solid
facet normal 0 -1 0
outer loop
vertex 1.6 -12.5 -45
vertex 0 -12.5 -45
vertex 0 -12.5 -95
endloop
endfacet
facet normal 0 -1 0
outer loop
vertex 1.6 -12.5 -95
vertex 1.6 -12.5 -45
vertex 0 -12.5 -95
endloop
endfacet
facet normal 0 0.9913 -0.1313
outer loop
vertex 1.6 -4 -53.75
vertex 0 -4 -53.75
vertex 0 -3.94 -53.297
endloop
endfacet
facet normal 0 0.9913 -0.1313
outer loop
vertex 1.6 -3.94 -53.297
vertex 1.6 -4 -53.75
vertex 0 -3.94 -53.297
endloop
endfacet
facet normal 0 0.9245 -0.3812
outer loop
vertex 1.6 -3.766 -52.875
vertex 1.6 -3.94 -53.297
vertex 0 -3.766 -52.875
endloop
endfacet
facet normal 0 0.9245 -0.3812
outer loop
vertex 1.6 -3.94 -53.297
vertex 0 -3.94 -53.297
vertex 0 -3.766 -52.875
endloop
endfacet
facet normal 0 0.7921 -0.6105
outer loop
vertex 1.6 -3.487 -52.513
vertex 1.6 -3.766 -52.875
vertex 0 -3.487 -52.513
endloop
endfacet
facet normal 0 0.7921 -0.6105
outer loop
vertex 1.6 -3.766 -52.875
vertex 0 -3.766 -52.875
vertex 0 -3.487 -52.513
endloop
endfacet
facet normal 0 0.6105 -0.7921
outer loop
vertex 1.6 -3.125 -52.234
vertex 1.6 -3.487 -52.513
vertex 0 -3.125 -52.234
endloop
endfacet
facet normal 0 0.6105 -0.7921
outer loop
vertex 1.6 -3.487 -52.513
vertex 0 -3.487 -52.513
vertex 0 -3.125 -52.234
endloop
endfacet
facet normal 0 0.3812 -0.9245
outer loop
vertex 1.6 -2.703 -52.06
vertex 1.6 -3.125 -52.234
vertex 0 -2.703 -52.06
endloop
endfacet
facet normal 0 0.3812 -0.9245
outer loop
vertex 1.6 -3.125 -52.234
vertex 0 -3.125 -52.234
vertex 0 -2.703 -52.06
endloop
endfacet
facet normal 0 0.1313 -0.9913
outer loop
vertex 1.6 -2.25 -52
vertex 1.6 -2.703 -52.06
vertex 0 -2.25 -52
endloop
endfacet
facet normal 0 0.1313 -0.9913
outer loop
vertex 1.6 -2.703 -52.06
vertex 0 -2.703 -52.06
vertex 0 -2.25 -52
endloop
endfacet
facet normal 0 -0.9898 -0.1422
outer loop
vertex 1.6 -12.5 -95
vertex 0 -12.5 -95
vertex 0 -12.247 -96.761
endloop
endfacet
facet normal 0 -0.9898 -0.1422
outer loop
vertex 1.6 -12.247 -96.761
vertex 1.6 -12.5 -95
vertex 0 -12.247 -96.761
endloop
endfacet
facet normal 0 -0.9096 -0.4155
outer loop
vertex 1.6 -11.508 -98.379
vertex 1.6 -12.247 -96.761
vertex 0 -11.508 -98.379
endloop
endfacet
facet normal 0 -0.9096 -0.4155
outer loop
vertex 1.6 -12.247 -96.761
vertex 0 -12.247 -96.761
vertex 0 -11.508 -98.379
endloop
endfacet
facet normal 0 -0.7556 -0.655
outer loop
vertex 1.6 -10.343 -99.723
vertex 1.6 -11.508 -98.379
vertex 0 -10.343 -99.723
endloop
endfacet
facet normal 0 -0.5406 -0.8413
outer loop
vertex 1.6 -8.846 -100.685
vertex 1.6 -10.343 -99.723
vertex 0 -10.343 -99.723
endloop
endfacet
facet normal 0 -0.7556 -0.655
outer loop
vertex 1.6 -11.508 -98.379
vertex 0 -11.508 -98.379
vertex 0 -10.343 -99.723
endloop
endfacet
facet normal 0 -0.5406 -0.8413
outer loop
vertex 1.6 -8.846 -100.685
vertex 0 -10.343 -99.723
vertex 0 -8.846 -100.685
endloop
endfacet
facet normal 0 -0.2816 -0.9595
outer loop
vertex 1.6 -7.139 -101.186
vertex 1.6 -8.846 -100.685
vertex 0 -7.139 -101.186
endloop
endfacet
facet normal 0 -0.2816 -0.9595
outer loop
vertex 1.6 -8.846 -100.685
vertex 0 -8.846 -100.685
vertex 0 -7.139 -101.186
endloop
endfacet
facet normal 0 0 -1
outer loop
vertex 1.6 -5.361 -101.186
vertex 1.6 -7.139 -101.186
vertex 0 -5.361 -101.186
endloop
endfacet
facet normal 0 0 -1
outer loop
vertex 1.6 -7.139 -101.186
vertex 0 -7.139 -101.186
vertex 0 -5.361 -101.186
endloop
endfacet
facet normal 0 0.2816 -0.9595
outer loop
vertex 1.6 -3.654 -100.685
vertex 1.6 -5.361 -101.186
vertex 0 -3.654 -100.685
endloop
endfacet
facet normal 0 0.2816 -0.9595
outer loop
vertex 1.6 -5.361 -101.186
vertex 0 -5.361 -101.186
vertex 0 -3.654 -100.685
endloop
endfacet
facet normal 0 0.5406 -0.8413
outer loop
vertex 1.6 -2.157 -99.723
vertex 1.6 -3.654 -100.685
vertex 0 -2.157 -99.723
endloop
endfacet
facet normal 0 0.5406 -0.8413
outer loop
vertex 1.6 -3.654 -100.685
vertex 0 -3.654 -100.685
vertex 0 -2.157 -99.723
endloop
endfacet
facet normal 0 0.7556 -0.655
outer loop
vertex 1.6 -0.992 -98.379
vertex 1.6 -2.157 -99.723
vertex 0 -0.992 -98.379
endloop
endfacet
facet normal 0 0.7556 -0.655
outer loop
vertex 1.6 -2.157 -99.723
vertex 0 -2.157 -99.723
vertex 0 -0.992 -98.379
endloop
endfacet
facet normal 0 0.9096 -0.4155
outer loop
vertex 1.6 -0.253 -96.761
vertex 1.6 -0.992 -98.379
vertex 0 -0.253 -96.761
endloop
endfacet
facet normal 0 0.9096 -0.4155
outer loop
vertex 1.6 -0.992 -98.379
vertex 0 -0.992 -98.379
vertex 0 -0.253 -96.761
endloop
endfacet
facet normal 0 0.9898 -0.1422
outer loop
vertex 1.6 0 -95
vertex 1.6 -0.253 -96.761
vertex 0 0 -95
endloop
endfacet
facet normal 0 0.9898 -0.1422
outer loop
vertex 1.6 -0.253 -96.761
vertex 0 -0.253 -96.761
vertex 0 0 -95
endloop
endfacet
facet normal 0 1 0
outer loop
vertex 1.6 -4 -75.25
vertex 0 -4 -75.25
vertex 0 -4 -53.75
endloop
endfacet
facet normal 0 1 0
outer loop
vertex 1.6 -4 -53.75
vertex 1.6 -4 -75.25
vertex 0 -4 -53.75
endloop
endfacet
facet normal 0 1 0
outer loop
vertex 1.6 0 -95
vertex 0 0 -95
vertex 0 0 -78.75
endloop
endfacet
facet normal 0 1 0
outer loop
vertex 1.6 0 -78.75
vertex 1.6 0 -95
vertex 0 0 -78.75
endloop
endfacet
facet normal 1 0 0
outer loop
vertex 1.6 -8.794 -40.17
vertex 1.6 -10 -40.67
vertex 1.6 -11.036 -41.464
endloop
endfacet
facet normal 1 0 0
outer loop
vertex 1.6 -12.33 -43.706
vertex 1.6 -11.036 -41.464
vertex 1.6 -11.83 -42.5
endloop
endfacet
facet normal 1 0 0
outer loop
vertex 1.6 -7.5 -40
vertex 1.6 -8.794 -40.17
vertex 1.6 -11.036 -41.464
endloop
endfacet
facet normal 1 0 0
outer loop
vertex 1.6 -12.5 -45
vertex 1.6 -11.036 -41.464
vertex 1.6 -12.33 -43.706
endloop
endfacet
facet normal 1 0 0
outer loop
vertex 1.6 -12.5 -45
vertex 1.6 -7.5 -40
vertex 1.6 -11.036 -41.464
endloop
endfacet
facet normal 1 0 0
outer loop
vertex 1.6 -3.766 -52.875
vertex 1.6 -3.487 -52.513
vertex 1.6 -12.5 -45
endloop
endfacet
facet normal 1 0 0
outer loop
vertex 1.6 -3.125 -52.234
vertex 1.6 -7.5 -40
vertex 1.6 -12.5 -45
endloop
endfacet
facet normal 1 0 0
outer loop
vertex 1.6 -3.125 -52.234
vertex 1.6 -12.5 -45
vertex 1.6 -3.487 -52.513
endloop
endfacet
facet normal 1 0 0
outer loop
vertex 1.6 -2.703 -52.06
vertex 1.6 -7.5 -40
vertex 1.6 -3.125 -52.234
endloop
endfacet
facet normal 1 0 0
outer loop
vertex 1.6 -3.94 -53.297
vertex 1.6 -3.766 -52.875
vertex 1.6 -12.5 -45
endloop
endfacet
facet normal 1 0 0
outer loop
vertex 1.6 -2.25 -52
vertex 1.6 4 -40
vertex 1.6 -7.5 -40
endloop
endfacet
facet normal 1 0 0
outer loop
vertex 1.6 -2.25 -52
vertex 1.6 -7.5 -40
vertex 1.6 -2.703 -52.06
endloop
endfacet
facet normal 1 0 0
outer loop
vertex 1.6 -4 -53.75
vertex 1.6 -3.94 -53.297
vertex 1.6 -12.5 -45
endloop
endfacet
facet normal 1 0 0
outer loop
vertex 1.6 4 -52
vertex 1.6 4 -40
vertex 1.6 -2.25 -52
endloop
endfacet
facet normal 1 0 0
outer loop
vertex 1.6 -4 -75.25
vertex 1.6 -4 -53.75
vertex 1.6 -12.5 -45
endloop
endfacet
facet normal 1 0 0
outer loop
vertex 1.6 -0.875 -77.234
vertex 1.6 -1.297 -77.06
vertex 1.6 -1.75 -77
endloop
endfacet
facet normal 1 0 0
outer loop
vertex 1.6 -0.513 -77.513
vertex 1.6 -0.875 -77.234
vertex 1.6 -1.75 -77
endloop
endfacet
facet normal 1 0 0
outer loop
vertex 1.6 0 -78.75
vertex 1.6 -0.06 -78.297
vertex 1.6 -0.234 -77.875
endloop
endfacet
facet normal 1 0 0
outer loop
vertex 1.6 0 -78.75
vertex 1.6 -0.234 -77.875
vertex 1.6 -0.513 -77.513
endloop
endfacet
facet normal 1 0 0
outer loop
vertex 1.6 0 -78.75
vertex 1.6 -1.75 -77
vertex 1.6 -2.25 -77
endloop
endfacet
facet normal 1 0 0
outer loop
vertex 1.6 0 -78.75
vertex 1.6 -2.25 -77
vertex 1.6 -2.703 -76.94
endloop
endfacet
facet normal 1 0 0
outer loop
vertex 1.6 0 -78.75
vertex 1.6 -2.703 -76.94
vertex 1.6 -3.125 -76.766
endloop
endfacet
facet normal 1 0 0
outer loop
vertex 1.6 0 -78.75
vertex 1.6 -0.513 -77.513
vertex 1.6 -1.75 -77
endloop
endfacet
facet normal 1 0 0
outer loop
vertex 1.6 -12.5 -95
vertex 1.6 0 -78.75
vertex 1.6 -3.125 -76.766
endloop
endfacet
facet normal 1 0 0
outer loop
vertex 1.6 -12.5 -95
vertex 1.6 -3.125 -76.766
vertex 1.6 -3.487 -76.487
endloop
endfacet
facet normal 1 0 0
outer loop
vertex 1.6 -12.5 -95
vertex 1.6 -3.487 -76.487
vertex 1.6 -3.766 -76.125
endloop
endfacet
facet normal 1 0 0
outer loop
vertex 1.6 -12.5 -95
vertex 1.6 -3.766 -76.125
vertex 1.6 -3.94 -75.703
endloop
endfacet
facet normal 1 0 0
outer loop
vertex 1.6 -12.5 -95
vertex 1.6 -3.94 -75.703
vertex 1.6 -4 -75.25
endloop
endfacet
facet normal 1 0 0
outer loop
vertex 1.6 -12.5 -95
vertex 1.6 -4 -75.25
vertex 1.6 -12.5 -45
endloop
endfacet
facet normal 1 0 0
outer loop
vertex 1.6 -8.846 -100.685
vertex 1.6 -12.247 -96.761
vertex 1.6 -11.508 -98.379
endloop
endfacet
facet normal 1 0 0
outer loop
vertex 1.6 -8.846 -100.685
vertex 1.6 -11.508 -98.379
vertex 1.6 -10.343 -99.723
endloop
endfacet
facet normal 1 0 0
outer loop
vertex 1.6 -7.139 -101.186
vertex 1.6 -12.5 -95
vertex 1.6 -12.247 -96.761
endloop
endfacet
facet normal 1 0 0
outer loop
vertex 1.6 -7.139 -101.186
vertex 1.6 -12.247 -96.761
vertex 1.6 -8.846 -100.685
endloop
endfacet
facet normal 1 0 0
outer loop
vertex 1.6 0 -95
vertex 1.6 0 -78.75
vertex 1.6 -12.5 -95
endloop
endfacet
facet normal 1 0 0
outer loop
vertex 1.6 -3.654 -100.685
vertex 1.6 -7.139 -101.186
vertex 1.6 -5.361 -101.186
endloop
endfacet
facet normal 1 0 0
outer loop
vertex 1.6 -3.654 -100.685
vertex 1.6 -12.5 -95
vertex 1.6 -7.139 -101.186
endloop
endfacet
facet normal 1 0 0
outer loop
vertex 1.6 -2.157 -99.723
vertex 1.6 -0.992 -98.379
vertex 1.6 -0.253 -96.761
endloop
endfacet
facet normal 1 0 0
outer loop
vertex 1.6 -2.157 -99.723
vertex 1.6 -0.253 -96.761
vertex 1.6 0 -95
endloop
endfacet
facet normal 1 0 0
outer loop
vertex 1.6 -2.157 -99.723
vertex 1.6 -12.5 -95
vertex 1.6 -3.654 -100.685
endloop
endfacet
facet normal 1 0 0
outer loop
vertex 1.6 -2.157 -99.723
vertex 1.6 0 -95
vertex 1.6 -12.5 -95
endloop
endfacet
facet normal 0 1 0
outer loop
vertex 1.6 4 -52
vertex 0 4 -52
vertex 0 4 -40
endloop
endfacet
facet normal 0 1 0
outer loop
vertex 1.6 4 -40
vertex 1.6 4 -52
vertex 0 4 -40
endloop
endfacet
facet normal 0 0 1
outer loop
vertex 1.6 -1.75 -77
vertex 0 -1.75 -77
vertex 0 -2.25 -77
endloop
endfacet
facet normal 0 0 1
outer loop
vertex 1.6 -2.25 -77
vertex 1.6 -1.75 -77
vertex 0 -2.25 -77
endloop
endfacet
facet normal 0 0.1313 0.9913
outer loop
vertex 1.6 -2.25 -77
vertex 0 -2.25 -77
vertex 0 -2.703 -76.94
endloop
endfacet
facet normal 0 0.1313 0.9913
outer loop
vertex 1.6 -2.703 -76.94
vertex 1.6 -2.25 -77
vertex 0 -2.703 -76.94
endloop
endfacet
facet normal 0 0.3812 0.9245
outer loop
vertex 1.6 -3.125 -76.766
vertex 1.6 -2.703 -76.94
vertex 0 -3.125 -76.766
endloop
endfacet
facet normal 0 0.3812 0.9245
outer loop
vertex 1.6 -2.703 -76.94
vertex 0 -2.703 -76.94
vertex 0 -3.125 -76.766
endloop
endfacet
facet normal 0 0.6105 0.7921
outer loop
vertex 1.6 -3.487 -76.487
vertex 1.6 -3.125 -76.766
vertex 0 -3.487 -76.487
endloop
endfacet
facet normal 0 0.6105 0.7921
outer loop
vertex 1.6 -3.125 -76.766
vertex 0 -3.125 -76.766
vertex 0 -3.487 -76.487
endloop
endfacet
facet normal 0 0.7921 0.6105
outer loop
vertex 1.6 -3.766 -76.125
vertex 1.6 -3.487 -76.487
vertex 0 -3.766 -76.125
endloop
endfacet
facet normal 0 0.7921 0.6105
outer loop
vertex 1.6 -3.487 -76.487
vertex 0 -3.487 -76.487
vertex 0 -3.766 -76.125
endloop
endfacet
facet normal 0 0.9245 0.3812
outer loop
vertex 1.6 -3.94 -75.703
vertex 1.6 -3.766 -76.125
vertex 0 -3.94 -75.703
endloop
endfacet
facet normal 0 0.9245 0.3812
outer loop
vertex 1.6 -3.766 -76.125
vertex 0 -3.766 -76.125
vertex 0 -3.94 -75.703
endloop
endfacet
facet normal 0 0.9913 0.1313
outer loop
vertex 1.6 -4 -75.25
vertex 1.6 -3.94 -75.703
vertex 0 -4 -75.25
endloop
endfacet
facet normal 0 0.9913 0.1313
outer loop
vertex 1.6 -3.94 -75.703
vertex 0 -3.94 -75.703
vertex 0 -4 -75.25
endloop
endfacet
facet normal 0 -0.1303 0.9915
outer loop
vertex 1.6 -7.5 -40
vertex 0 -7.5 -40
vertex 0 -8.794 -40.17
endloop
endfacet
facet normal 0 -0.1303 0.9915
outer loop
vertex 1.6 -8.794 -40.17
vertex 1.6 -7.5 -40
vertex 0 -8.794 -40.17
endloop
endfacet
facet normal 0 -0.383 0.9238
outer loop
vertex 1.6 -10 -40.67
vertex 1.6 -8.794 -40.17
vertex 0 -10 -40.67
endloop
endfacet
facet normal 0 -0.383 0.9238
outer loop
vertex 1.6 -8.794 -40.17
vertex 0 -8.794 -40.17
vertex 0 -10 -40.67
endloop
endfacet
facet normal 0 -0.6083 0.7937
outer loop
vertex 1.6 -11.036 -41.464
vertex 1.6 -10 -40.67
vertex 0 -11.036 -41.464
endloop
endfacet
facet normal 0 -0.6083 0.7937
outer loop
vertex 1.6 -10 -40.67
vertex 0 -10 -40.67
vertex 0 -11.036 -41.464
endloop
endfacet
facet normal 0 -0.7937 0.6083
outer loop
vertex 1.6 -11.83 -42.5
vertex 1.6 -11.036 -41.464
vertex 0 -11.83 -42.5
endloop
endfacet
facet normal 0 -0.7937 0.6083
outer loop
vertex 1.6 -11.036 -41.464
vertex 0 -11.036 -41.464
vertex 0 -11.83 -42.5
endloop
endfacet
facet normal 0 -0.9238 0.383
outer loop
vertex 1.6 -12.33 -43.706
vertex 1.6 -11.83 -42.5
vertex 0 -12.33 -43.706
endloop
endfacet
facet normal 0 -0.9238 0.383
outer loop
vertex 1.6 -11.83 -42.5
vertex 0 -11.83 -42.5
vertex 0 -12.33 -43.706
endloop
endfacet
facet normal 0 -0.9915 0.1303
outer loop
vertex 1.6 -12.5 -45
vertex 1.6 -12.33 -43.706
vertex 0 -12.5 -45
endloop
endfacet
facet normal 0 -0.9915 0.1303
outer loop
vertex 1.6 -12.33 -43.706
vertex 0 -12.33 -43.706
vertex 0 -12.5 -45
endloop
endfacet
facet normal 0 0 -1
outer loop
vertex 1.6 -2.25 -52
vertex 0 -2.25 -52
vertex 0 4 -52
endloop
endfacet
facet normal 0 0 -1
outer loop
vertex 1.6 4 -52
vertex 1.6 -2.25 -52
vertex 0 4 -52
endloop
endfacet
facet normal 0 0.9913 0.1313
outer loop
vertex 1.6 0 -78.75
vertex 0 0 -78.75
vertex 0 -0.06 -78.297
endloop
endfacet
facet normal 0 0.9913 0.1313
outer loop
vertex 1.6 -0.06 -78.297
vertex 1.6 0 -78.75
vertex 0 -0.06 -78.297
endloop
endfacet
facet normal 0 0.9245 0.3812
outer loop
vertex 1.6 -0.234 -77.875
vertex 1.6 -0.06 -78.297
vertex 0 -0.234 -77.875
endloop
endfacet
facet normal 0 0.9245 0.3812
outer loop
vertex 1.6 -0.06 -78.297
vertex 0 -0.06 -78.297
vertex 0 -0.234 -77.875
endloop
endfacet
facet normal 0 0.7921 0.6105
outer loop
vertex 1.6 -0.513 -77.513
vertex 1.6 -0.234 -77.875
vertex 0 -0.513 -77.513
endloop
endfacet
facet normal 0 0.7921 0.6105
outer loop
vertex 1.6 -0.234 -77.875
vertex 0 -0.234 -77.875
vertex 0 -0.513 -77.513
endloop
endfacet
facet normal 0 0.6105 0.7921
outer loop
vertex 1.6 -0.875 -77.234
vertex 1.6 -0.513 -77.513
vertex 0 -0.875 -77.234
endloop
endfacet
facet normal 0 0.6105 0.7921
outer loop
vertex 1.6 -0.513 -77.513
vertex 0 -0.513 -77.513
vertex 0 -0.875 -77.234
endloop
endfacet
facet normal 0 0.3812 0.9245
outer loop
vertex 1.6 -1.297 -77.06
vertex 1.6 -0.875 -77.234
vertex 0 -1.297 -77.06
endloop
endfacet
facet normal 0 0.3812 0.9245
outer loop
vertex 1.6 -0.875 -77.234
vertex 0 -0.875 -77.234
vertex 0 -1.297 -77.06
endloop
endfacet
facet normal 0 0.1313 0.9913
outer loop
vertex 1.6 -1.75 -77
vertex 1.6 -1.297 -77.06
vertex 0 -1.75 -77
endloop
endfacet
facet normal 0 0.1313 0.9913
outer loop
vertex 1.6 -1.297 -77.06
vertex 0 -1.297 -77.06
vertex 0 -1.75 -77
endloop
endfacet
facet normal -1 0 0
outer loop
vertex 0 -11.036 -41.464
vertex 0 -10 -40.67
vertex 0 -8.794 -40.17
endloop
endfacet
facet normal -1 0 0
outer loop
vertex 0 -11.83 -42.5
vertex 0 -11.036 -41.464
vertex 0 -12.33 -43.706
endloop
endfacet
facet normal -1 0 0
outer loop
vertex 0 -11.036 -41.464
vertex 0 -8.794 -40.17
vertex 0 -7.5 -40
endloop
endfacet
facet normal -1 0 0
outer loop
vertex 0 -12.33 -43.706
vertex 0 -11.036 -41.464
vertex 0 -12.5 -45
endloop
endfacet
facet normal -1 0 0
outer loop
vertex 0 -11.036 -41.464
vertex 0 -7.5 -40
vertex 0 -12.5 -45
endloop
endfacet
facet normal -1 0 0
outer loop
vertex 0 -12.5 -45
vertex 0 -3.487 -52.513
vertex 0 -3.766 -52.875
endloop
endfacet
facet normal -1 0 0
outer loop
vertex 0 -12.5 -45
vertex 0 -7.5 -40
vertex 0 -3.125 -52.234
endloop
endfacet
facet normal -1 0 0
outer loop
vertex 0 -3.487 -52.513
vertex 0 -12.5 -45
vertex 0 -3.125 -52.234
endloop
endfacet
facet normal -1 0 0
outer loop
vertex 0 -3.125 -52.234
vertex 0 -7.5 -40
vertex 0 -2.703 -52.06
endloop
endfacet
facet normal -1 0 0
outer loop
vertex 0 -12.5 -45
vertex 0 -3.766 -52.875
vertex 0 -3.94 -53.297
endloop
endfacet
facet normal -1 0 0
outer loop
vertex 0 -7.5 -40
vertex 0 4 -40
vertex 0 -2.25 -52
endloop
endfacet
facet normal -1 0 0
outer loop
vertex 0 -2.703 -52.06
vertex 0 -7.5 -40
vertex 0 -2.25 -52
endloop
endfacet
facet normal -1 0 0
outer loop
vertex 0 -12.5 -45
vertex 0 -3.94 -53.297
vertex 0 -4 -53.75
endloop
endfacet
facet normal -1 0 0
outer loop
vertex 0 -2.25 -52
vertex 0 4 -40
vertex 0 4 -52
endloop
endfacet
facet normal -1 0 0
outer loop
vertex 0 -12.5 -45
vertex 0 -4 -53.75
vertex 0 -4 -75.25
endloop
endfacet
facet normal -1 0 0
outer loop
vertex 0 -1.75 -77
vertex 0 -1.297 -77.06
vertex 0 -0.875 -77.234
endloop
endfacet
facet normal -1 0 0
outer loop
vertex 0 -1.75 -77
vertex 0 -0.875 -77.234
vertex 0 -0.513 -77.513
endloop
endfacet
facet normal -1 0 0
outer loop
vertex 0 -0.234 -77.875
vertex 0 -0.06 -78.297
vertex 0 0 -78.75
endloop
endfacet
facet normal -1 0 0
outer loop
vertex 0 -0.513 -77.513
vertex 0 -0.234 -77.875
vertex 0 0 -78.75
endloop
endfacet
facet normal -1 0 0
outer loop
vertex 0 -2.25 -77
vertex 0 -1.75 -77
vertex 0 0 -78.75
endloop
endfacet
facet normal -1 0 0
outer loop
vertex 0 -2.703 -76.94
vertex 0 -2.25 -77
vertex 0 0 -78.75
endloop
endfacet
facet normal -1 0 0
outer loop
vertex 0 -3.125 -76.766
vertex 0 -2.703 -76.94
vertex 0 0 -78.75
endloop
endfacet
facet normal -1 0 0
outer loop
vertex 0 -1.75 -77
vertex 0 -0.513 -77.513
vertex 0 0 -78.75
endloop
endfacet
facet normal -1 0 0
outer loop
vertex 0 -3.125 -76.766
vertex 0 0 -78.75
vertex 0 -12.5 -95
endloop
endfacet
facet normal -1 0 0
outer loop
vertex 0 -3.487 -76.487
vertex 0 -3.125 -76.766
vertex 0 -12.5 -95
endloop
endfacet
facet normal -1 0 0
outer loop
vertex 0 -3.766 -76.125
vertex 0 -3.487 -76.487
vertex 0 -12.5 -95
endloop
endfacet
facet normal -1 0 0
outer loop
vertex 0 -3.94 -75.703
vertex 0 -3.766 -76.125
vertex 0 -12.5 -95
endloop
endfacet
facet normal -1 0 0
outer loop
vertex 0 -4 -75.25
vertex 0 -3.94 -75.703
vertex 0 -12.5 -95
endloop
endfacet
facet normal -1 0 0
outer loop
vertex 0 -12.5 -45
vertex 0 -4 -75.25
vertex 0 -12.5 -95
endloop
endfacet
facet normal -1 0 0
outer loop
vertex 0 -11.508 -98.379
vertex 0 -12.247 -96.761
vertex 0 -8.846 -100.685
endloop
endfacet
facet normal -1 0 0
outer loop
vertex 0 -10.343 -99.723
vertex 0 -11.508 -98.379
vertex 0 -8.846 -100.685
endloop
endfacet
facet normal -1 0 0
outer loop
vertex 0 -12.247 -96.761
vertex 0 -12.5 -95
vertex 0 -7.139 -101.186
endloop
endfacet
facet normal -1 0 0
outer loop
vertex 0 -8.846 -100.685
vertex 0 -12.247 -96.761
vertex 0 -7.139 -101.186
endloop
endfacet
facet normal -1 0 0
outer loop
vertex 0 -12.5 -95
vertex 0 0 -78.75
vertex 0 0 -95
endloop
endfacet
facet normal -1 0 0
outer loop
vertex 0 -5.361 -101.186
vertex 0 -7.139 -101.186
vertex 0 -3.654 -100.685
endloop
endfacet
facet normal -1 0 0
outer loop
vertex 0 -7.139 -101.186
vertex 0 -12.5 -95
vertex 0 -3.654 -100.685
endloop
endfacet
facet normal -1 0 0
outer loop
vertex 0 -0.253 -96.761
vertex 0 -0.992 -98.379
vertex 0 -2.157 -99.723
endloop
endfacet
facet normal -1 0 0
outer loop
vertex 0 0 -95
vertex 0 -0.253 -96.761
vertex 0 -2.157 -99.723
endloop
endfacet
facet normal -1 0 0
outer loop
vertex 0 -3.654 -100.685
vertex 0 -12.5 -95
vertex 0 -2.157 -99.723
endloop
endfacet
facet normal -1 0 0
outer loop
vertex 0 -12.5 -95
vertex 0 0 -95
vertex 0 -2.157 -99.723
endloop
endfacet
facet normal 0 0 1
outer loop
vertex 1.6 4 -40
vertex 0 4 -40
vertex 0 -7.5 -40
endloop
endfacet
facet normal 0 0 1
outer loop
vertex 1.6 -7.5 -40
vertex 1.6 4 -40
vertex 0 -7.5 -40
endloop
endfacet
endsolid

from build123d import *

# Parameters (mm, degrees)
AUFSATZ_LINEAR_AUSTRAGEN1_DEPTH = 1.6


with BuildPart() as part:
    # Skizze1 → Aufsatz-Linear austragen1 (new body)
    with BuildSketch(Plane(origin=(0, 0, 0), x_dir=(0, 0, -1), z_dir=(1, 0, 0))):
        with BuildLine():
            Line((45, -12.5), (95, -12.5))
            ThreePointArc((95, -12.5), (101.25, -6.25), (95, 0))
            Line((95, 0), (78.75, 0))
            ThreePointArc((78.75, 0), (77.512563133, -0.512563133), (77, -1.75))
            Line((77, -1.75), (77, -2.25))
            ThreePointArc((77, -2.25), (76.487436867, -3.487436867), (75.25, -4))
            Line((75.25, -4), (53.75, -4))
            ThreePointArc((53.75, -4), (52.512563133, -3.487436867), (52, -2.25))
            Line((52, -2.25), (52, 4))
            Line((52, 4), (40, 4))
            Line((40, 4), (40, -4))
            Line((40, -4), (40, -7.5))
            ThreePointArc((40, -7.5), (41.464466094, -11.035533906), (45, -12.5))
        make_face()
    extrude(amount=AUFSATZ_LINEAR_AUSTRAGEN1_DEPTH)


solid = part.part
